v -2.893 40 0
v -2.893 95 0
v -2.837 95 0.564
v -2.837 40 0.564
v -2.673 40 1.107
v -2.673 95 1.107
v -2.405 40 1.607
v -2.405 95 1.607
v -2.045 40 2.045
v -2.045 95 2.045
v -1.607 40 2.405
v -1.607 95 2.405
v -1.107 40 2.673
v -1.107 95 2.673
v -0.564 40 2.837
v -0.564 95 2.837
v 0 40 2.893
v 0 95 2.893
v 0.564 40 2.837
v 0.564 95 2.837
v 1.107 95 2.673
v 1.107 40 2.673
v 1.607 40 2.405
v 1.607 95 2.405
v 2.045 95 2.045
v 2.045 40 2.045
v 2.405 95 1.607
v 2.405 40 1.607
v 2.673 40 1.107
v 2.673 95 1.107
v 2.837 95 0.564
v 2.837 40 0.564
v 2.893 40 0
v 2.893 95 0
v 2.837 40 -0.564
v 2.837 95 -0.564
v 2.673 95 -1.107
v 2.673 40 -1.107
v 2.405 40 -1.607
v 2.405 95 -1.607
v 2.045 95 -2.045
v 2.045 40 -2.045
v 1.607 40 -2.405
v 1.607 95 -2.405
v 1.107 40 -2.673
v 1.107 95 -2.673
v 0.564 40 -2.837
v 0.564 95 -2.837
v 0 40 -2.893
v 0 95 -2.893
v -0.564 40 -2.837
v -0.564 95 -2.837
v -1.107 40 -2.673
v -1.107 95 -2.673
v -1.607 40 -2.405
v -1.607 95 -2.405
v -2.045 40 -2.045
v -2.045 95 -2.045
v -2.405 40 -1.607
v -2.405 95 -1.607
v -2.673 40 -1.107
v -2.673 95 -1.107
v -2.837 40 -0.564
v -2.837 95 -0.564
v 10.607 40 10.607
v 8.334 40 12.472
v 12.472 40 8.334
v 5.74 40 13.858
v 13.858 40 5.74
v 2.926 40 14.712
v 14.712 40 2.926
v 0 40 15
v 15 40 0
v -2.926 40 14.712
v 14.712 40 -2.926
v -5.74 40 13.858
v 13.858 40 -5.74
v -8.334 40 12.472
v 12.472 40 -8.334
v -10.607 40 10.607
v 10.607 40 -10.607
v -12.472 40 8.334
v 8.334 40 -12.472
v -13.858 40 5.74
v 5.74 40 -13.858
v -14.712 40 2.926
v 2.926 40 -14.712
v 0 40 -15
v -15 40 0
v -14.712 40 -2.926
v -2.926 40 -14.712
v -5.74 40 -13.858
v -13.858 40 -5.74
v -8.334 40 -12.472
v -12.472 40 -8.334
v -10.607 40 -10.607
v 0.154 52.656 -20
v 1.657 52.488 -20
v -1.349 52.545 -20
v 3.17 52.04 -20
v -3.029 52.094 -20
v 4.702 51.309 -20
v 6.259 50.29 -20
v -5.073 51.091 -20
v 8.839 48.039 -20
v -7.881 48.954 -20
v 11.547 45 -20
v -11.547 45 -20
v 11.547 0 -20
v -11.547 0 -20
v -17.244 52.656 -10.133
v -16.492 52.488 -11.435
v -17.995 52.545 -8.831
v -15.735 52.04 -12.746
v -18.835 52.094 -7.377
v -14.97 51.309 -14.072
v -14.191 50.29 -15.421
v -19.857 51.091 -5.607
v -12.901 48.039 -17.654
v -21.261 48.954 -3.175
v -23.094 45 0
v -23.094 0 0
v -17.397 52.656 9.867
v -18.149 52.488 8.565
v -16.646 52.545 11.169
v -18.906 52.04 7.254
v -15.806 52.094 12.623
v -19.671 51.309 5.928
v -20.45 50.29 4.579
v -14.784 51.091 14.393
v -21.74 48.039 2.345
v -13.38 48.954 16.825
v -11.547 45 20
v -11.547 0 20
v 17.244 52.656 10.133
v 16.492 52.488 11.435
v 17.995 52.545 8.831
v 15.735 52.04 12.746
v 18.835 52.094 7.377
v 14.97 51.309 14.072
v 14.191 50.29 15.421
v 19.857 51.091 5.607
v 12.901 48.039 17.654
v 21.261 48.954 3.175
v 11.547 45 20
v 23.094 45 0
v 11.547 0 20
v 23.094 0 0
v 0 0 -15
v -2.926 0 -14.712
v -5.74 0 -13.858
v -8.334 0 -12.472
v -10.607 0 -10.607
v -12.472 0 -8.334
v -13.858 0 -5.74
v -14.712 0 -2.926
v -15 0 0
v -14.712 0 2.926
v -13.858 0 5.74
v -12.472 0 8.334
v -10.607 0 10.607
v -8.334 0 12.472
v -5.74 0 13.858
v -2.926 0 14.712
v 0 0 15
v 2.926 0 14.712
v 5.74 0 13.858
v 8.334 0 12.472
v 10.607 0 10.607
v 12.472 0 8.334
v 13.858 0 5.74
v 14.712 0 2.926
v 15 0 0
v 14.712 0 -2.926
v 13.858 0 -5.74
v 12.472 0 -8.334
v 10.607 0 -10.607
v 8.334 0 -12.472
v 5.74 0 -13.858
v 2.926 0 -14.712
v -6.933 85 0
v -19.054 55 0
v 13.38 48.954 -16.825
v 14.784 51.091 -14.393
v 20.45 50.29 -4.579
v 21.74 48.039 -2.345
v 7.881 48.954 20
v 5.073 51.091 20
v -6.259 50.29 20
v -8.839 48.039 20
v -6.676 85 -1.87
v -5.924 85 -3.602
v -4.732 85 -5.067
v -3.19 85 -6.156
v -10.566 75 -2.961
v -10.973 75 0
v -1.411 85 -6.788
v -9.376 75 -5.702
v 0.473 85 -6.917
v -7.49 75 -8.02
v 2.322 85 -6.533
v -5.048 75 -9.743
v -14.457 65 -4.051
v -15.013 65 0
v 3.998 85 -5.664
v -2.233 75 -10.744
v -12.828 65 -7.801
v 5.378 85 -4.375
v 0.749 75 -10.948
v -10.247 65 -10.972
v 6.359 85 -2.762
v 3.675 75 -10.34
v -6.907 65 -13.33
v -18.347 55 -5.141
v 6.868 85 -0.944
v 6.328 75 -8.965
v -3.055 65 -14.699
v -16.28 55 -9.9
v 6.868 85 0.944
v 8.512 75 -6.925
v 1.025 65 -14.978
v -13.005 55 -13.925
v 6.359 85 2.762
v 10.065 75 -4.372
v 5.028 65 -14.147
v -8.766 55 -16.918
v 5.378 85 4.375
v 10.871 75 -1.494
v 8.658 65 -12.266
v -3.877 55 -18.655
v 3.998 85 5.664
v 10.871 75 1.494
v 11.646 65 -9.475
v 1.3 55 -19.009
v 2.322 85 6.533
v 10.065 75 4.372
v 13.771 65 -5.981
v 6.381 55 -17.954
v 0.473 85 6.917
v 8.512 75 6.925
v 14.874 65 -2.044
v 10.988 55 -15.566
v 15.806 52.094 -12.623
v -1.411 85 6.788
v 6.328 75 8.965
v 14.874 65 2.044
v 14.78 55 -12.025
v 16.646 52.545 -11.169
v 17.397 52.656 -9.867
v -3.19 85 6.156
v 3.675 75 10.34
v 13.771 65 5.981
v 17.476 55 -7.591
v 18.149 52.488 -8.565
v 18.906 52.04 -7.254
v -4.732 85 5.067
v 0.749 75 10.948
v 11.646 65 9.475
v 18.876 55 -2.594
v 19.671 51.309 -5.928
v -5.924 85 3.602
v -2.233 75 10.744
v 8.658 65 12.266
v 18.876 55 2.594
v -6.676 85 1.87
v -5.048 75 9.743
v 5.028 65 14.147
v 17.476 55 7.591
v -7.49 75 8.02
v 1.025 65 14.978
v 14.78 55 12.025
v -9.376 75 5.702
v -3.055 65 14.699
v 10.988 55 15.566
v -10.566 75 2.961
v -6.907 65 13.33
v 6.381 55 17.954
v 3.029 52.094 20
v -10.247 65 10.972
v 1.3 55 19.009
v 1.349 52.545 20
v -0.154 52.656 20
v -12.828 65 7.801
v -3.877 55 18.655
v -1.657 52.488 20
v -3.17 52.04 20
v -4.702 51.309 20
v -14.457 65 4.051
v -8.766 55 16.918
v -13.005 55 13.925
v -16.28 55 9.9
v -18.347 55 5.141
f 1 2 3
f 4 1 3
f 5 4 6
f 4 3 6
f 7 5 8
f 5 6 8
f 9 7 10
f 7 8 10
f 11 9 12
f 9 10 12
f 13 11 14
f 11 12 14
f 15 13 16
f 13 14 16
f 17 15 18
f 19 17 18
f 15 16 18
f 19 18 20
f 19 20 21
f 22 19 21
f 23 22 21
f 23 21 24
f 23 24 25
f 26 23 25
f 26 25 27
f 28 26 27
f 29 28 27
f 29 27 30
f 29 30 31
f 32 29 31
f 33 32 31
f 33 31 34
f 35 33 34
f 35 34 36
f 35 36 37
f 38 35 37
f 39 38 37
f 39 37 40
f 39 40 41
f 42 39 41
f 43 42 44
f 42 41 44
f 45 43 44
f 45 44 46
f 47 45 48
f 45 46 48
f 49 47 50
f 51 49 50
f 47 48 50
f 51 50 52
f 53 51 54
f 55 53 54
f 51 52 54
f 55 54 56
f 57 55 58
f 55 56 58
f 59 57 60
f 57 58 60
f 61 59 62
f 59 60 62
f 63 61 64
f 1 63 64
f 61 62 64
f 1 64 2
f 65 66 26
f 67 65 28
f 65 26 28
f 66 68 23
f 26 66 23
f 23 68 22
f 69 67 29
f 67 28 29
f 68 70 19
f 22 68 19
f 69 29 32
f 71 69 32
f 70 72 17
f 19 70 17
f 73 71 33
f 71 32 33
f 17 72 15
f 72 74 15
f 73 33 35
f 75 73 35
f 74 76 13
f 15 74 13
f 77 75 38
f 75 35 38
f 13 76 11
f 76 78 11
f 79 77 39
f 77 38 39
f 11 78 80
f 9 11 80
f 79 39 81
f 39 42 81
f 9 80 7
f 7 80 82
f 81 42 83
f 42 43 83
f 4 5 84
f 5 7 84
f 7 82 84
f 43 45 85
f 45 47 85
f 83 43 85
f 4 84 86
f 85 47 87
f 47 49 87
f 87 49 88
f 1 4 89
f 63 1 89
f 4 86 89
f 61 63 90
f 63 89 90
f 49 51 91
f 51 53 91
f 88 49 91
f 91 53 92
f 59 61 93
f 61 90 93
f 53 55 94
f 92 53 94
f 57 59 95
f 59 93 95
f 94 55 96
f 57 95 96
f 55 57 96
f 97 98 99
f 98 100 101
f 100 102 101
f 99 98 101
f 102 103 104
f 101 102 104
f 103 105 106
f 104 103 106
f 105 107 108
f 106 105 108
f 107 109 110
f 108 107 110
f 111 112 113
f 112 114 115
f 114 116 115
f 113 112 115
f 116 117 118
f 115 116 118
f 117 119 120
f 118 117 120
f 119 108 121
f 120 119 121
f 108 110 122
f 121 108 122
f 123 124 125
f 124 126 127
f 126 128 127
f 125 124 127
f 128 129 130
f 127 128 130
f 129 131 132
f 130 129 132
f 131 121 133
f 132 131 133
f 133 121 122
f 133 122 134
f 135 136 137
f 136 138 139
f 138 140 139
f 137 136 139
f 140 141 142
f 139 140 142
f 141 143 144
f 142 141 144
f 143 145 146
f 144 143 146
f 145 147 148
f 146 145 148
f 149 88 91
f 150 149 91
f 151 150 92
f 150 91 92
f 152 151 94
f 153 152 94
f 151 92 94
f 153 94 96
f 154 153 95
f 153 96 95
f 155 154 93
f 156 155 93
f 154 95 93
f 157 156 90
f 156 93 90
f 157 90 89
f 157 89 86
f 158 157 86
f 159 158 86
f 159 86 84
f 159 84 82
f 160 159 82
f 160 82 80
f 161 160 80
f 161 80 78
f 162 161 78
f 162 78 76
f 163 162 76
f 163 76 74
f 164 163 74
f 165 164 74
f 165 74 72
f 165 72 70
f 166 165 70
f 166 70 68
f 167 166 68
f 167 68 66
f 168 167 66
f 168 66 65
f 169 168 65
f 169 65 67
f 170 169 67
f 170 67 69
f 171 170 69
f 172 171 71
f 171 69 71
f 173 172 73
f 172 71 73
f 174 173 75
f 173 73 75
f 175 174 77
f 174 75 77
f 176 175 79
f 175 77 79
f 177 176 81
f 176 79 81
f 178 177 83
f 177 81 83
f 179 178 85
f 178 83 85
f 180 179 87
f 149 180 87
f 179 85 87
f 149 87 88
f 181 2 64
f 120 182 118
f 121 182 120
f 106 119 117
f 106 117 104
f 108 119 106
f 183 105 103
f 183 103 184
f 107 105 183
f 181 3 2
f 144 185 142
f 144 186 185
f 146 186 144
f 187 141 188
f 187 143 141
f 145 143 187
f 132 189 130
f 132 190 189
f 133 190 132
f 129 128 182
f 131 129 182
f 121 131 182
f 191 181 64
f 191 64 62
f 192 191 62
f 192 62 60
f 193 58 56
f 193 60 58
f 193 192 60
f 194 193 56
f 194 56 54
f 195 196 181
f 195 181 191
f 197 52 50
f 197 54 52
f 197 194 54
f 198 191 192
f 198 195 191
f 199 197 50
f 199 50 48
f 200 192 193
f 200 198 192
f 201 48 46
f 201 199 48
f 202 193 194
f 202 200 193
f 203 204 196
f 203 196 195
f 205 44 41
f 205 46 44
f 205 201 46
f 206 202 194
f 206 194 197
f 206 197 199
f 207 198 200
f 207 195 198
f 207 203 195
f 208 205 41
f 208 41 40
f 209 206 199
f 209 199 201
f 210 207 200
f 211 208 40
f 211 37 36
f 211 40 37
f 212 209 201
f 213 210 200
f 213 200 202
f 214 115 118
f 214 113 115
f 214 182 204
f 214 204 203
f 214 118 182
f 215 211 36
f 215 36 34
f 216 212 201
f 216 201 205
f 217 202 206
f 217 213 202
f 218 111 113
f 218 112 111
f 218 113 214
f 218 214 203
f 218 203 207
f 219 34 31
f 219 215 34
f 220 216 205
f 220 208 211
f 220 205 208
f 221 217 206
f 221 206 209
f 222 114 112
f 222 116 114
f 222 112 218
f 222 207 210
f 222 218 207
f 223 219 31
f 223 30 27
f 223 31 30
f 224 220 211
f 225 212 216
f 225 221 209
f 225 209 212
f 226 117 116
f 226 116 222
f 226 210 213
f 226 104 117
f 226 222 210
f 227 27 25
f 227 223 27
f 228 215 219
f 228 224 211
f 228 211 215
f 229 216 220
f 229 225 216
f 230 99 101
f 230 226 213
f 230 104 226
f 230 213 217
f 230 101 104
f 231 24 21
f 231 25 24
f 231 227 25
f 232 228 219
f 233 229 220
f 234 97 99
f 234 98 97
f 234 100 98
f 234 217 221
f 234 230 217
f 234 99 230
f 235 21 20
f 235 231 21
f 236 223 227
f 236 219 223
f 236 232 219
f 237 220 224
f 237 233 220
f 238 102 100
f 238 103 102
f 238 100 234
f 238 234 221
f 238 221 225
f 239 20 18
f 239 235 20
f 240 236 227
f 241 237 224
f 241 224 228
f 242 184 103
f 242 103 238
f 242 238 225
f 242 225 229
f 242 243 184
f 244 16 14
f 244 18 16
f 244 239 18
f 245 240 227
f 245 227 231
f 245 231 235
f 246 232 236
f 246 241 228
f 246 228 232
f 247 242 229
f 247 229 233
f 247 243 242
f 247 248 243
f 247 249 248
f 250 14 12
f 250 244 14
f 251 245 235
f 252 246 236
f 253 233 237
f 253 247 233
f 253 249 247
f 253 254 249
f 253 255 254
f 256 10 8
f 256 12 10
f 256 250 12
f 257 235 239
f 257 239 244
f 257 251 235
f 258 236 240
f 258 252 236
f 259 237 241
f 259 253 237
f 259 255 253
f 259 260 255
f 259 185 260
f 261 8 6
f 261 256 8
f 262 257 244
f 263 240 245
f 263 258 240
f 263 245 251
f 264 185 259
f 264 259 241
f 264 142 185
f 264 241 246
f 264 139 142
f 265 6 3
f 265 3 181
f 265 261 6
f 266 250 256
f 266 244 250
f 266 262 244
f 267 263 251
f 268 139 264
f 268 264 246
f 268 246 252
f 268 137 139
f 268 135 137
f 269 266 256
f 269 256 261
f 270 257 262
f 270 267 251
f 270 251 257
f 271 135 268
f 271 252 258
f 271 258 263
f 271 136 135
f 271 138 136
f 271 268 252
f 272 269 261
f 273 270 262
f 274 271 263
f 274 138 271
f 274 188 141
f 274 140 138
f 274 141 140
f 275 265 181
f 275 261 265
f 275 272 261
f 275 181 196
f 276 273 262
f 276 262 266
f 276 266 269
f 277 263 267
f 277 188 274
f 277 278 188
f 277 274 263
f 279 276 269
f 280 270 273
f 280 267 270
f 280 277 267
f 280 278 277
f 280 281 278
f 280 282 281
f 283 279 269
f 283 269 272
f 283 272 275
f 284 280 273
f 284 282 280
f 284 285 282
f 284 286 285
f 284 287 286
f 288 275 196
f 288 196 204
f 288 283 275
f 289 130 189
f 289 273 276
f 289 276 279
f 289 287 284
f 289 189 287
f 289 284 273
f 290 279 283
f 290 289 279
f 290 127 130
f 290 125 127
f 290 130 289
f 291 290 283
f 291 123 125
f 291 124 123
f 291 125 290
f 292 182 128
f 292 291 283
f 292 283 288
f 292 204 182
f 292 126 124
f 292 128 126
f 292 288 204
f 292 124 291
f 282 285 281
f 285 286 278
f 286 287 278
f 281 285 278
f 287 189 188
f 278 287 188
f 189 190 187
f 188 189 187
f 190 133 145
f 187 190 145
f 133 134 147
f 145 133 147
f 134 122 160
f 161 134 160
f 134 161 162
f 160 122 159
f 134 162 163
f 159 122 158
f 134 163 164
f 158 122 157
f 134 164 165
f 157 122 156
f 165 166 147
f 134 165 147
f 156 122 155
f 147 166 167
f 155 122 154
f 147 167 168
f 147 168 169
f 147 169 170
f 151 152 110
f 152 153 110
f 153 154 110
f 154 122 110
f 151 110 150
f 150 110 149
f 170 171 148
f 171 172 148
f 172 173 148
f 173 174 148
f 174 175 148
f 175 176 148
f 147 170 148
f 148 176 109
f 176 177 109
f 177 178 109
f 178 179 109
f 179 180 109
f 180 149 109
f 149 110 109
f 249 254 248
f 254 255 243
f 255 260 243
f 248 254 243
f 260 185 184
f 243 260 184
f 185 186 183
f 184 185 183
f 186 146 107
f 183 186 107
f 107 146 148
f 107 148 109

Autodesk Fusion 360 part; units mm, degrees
sketch "Esquisse1" plane through (0, 0, 0) normal (0, 1, 0) x (1, 0, 0)
  line L0 (11.547, -20) -> (23.094, 0)
  line L1 (23.094, 0) -> (11.547, 20)
  line L2 (11.547, 20) -> (-11.547, 20)
  line L3 (-11.547, 20) -> (-23.094, 0)
  line L4 (-23.094, 0) -> (-11.547, -20)
  line L5 (-11.547, -20) -> (11.547, -20)
  dimension "d1" = 20
extrude "Extrusion1" add sketch "Esquisse1" along normal blind 95
sketch "Esquisse3" plane through (0, 0, 0) normal (0, 0, 1) x (1, 0, 0)
  line L0 (11.547, 95) -> (-11.547, 95)
  line L1 (-2.8927, 95) -> (-23.094, 45)
  line L2 (-23.094, 45) -> (-23.094, 95)
  line L3 (-23.094, 95) -> (-2.8927, 95)
  line L4 (-23.094, 0) -> (-23.094, 95)
  point P0 (0, 95)
  dimension "d8" = 50
  dimension "d9" = 22
revolve "Révolution1" cut sketch "Esquisse3" angle 360 about axis through (0, 1.75, 0) along (0, 1, 0)
extrude "Extrusion2" cut 1 faces at (0.2146, 95, -0.8551) along direction (0, -1, 0) blind 130
hole "Perçage1" at (0, 0, 0) direction (0, 1, 0) diameter 30 depth 40 tip angle 180
